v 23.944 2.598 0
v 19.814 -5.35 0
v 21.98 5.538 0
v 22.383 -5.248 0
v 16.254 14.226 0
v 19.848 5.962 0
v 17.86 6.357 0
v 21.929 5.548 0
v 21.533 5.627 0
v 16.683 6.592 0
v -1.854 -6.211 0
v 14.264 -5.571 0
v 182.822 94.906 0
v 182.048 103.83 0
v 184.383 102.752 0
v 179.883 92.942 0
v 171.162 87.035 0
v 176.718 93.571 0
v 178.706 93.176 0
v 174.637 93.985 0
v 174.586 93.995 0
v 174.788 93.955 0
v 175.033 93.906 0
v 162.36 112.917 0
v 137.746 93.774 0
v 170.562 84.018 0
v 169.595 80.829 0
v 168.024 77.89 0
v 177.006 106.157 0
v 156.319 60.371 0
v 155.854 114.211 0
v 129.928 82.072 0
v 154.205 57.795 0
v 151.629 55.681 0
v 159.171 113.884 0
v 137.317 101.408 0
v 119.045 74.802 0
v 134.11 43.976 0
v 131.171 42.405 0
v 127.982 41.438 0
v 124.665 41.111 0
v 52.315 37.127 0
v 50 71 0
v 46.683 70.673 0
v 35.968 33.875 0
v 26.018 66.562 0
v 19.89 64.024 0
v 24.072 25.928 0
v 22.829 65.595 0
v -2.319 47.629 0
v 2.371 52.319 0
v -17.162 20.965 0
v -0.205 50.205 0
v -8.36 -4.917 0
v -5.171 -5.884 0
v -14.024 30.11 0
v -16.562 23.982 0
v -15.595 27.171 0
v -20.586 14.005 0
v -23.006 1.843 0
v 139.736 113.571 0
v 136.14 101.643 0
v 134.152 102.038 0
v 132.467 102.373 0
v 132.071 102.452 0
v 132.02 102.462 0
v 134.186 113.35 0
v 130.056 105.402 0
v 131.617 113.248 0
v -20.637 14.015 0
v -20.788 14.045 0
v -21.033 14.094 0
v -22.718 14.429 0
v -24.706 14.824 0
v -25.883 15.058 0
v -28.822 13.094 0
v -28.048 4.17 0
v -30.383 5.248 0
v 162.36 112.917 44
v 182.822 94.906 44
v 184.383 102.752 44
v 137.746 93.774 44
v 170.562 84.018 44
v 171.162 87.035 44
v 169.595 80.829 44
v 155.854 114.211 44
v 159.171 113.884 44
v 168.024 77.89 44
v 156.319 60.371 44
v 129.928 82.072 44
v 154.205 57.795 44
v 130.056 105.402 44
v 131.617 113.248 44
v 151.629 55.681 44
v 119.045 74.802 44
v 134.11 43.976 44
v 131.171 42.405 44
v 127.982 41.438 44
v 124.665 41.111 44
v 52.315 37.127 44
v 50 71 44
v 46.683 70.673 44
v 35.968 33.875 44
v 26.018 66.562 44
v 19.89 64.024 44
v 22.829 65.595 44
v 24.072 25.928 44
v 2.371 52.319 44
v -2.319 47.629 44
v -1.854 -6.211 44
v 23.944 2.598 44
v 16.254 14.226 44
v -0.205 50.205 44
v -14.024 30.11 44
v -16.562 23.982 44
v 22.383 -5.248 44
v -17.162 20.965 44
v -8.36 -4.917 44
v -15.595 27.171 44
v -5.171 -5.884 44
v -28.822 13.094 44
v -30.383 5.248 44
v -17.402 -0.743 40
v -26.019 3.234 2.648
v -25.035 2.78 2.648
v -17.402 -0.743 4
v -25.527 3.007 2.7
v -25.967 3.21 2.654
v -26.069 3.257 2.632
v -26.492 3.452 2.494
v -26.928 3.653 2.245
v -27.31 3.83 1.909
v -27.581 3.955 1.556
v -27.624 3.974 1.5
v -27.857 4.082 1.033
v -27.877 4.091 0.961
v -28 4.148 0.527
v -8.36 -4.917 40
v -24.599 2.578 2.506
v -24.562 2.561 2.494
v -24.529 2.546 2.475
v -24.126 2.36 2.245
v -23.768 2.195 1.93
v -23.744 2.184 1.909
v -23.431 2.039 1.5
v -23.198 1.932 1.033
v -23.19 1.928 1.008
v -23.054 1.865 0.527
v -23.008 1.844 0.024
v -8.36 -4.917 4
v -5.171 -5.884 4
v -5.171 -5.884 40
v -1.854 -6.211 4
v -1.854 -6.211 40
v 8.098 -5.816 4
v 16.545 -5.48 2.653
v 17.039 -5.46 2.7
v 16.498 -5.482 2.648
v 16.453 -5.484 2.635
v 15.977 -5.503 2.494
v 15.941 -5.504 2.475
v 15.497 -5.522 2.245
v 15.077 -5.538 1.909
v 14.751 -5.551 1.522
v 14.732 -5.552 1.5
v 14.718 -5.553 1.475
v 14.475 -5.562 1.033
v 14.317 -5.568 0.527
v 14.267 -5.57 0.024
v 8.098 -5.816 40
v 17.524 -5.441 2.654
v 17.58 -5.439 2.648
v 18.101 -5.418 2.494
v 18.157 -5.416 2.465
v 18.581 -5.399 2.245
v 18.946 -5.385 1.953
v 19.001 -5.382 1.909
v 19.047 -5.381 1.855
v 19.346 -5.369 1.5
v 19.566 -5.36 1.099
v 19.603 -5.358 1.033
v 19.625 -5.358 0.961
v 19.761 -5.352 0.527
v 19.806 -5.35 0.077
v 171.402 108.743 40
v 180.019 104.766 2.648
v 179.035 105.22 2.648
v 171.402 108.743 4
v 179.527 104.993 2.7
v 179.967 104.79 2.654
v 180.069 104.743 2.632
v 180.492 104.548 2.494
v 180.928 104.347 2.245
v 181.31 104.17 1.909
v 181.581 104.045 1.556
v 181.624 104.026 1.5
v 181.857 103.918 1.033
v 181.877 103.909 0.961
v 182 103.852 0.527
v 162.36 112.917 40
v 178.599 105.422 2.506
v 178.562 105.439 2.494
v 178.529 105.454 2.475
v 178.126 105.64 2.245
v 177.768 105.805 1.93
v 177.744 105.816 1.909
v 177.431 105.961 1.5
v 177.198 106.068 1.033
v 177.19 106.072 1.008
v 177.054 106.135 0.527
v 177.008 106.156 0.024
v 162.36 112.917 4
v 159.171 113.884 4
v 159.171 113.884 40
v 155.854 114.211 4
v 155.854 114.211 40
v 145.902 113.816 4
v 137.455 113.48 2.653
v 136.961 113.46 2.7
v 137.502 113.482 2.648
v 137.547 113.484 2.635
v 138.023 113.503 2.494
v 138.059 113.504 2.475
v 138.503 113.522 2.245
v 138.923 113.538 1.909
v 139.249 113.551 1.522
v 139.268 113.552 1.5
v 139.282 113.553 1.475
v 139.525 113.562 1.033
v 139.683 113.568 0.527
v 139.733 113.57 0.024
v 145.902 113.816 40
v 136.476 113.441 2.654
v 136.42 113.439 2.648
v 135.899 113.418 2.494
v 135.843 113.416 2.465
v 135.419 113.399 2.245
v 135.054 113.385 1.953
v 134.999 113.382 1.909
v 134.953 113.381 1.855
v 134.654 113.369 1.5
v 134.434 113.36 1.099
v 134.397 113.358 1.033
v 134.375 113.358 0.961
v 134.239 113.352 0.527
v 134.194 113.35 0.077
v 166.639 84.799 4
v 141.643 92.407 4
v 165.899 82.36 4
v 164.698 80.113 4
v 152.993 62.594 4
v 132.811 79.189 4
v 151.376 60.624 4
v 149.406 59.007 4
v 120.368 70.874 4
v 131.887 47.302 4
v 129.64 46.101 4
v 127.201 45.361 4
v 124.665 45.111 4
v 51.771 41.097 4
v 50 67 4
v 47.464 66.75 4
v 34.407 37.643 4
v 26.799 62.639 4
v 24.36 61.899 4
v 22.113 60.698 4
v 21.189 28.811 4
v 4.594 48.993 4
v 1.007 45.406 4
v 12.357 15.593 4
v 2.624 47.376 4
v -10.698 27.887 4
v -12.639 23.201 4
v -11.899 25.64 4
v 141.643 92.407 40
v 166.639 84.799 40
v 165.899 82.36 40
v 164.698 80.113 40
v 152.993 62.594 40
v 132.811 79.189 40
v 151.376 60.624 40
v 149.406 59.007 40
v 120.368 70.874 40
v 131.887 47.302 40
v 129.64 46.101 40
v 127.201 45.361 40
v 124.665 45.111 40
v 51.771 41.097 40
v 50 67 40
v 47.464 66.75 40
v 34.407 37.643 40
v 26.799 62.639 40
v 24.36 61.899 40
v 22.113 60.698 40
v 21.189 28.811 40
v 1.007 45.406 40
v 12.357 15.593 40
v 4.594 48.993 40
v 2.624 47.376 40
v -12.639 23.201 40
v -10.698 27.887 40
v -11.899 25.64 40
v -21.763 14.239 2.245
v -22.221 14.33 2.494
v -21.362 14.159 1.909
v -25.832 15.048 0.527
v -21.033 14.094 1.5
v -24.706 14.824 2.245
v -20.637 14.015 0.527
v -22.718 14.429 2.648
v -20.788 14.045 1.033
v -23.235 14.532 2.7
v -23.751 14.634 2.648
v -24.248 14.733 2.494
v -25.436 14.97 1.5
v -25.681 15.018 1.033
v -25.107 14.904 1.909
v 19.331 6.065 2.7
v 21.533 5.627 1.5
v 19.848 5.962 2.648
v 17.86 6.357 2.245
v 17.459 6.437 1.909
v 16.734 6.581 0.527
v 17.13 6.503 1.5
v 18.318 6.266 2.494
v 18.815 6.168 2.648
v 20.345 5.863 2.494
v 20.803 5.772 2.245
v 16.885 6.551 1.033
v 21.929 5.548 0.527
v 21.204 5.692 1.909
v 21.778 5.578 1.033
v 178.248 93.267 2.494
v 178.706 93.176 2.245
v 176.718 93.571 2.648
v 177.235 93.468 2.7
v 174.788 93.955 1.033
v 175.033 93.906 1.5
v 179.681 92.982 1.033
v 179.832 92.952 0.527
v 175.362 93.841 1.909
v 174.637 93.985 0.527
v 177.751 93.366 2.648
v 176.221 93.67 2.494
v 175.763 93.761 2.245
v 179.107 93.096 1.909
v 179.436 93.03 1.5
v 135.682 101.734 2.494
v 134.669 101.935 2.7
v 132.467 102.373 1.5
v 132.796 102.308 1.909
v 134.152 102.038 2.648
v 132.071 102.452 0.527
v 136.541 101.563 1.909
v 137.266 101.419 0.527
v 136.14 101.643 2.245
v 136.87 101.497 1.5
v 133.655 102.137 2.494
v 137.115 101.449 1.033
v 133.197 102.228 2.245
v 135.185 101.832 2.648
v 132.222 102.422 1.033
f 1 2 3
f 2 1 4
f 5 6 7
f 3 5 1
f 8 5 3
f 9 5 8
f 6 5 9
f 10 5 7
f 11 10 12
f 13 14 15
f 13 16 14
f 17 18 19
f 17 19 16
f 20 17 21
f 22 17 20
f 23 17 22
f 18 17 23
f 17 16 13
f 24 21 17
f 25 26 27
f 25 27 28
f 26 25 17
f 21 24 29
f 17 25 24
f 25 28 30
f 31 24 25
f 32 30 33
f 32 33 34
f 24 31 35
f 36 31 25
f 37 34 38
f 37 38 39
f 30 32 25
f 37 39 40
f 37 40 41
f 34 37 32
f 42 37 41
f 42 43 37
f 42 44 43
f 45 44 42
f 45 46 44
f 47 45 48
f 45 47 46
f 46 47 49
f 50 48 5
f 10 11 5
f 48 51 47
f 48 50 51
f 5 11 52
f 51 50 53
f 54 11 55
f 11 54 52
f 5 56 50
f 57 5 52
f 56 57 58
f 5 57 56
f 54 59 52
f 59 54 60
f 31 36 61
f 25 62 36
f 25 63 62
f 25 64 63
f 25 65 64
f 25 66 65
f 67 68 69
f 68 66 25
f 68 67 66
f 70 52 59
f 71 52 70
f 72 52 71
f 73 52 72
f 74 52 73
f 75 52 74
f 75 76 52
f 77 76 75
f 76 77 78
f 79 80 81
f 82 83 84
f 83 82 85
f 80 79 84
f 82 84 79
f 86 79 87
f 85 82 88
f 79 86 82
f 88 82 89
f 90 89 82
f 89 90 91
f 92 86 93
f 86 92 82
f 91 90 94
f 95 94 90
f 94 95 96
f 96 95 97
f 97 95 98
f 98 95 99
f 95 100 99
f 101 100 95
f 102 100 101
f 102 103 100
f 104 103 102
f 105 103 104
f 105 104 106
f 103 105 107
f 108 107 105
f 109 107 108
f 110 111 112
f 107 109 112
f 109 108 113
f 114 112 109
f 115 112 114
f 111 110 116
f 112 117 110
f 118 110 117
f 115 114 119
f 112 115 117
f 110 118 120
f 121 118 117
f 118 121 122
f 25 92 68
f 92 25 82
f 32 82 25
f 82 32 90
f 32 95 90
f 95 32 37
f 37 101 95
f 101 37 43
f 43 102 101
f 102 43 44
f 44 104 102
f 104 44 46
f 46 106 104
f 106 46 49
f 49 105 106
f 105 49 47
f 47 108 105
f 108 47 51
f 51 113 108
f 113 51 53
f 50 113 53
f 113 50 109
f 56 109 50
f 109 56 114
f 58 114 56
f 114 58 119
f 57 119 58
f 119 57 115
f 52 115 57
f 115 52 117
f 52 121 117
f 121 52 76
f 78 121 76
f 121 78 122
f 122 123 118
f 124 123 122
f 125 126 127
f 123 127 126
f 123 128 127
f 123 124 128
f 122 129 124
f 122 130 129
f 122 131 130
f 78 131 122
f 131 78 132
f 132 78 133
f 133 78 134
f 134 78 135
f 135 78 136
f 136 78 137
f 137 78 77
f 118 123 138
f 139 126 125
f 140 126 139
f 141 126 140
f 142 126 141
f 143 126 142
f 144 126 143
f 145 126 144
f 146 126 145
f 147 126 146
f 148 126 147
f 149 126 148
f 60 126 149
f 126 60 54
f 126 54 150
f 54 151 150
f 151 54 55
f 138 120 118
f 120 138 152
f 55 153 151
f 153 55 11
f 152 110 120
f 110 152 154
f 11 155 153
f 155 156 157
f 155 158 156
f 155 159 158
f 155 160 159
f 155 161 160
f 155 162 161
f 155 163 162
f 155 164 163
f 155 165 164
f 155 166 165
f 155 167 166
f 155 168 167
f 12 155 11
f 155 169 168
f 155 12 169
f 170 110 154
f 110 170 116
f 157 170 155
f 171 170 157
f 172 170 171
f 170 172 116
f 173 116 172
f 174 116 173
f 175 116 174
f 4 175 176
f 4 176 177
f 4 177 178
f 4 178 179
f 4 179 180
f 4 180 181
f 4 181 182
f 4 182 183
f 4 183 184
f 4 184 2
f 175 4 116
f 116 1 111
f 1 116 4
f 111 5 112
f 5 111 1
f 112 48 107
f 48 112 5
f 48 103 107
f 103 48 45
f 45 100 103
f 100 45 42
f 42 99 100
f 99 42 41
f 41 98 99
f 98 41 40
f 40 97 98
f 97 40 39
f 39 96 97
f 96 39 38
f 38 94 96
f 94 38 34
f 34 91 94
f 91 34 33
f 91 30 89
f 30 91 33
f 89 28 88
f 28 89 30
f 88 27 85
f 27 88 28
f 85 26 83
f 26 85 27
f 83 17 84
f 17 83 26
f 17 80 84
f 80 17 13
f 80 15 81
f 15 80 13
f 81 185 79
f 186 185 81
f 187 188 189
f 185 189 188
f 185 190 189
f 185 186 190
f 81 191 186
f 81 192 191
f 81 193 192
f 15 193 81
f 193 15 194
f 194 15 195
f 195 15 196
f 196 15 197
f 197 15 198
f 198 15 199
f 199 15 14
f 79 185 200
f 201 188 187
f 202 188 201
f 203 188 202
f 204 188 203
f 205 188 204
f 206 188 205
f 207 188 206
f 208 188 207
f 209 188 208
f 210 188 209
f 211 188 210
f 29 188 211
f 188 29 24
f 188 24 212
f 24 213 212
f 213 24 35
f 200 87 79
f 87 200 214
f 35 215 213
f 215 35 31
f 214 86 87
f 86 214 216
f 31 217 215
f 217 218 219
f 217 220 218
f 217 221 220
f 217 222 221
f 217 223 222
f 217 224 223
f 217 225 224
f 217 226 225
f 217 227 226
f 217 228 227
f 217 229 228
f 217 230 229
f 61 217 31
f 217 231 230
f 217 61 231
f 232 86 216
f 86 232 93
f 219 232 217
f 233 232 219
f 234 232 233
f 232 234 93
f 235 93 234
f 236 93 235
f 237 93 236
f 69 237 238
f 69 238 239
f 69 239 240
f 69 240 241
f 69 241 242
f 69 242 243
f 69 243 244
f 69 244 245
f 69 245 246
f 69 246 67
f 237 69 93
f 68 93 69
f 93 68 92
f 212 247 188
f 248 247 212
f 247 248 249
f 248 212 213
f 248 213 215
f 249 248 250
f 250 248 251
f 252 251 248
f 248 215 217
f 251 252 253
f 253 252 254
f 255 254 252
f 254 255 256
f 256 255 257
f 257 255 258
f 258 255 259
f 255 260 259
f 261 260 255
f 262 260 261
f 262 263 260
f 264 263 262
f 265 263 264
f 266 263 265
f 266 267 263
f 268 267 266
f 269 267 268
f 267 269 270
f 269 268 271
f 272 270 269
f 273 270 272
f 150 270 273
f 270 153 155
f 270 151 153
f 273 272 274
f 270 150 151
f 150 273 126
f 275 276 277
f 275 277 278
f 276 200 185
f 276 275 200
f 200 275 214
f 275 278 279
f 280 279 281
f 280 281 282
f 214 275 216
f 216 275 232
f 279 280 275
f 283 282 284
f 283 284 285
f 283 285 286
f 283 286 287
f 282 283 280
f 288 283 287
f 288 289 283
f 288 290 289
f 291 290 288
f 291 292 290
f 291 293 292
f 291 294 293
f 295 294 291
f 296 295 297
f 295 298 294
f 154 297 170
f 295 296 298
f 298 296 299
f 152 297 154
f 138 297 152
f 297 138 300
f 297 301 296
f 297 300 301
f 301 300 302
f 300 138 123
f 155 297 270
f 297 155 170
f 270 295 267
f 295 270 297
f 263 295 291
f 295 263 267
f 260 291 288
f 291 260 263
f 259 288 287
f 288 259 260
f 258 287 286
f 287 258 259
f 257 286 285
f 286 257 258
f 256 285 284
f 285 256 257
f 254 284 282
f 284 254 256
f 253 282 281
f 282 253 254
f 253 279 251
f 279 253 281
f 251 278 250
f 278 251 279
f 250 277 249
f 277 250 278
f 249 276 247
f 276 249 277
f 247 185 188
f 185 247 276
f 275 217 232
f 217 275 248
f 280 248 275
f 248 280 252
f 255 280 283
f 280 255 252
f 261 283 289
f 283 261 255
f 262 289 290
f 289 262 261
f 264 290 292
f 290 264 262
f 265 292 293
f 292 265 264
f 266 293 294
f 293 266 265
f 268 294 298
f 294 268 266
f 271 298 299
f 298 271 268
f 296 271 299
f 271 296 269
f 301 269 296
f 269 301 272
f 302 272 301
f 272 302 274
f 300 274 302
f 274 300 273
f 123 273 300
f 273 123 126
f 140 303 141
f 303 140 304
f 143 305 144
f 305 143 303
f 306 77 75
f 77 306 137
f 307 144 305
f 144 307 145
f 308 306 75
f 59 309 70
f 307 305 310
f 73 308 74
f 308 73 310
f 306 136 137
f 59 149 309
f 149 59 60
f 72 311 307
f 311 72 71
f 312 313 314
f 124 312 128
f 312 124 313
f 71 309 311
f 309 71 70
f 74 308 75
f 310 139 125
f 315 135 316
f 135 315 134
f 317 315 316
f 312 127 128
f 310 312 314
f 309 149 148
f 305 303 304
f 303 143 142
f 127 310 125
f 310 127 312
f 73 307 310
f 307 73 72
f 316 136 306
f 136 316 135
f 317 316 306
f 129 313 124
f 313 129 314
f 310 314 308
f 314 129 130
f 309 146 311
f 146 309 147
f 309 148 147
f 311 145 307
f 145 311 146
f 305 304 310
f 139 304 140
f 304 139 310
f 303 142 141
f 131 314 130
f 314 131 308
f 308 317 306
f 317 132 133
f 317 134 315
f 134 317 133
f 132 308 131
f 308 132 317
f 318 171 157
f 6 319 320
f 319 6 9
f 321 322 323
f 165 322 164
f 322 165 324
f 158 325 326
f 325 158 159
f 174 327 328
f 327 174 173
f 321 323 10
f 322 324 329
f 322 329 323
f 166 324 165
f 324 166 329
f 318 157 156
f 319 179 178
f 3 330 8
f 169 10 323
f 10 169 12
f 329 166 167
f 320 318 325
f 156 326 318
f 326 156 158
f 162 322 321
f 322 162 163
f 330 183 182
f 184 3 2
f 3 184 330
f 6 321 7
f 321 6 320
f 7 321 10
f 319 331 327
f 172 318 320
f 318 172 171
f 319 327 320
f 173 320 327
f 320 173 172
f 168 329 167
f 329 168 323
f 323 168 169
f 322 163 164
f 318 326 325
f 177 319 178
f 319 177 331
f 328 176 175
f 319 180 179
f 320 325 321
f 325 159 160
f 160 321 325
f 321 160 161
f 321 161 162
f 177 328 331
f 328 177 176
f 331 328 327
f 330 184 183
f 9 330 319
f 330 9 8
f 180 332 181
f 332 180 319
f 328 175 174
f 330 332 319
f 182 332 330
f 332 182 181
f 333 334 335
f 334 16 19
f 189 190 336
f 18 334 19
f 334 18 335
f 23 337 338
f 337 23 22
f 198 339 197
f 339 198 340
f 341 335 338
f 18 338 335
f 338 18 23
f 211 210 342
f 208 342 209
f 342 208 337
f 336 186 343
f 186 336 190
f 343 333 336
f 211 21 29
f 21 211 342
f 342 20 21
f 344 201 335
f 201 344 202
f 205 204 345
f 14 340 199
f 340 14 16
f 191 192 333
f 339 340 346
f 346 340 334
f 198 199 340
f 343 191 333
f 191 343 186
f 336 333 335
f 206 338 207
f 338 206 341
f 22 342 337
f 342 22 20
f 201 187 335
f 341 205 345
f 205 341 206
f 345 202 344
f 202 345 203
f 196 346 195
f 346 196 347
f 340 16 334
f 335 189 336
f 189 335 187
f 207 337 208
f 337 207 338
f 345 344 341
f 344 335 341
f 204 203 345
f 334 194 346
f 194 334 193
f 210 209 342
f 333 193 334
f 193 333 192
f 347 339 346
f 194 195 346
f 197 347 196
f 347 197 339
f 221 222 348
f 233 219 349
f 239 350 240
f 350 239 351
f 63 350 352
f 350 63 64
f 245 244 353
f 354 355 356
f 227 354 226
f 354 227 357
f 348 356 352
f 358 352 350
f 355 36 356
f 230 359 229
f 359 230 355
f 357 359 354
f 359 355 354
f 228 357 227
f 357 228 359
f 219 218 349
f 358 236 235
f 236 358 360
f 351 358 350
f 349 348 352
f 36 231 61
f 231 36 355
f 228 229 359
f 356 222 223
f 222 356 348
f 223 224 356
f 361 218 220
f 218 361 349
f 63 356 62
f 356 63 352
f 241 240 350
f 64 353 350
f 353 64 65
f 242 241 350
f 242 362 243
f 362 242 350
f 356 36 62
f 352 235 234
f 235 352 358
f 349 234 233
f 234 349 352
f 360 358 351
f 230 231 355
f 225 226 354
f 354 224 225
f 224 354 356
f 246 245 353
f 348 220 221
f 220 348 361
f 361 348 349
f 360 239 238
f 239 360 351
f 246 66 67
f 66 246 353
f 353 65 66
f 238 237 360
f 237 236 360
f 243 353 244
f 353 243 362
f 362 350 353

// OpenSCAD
$fn = 32;

// ----------------------------------------------------------------------
// Air duct: 34 mm duct, 4 mm wall, 44 mm across
// ----------------------------------------------------------------------

// --- parameters (mm) ---
duct_r = 17;              // duct core radius
duct_d = 34;              // duct core diameter
wall = 4;                 // duct wall thickness
height = 44;              // duct width (extrusion height)
port_r = 26.9;            // port flange half width
port_d = 53.8;            // port flange width
port_t = 8;               // port flange thickness
bolt_d = 5.4;             // port bolt holes
bolt_offset = 21.7;       // bolt hole offset from the port axis

difference() {
  /* outer hull chain: tube with a flat flange plate at every port */
  linear_extrude(height = 44) {
    hull() {
      polygon([[22.383, -5.248], [-30.383, 5.248], [-28.822, 13.094], [23.944, 2.598]]);
      translate([-1.854, 10.789]) circle(r = 17);
    }
    hull() {
      translate([-1.854, 10.789]) circle(r = 17);
      translate([0.111, 20.665]) circle(r = 17);
    }
    hull() {
      translate([0.111, 20.665]) circle(r = 17);
      translate([11.816, 38.184]) circle(r = 17);
    }
    hull() {
      translate([11.816, 38.184]) circle(r = 17);
      translate([29.335, 49.889]) circle(r = 17);
    }
    hull() {
      translate([29.335, 49.889]) circle(r = 17);
      translate([50, 54]) circle(r = 17);
    }
    hull() {
      translate([50, 54]) circle(r = 17);
      translate([124.665, 58.111]) circle(r = 17);
    }
    hull() {
      translate([124.665, 58.111]) circle(r = 17);
      translate([142.184, 69.816]) circle(r = 17);
    }
    hull() {
      translate([142.184, 69.816]) circle(r = 17);
      translate([153.889, 87.335]) circle(r = 17);
    }
    hull() {
      translate([153.889, 87.335]) circle(r = 17);
      translate([155.854, 97.211]) circle(r = 17);
    }
    hull() {
      translate([155.854, 97.211]) circle(r = 17);
      polygon([[131.617, 113.248], [184.383, 102.752], [182.822, 94.906], [130.056, 105.402]]);
    }
  }
  /* air passage: the same chain inset by the wall, 5 mm proud of the ports */
  translate([0, 0, 4]) linear_extrude(height = 36) {
    hull() {
      translate([-4.975, -4.904]) circle(r = 13);
      translate([0.111, 20.665]) circle(r = 13);
    }
    hull() {
      translate([0.111, 20.665]) circle(r = 13);
      translate([11.816, 38.184]) circle(r = 13);
    }
    hull() {
      translate([11.816, 38.184]) circle(r = 13);
      translate([29.335, 49.889]) circle(r = 13);
    }
    hull() {
      translate([29.335, 49.889]) circle(r = 13);
      translate([50, 54]) circle(r = 13);
    }
    hull() {
      translate([50, 54]) circle(r = 13);
      translate([124.665, 58.111]) circle(r = 13);
    }
    hull() {
      translate([124.665, 58.111]) circle(r = 13);
      translate([142.184, 69.816]) circle(r = 13);
    }
    hull() {
      translate([142.184, 69.816]) circle(r = 13);
      translate([153.889, 87.335]) circle(r = 13);
    }
    hull() {
      translate([153.889, 87.335]) circle(r = 13);
      translate([158.975, 112.904]) circle(r = 13);
    }
  }
  translate([-4, 0]) rotate([0, 0, -11.25]) translate([-21.7, -2.5]) rotate([-90, 0, 0]) cylinder(h = 13, d = 5.4);
  translate([-4, 0]) rotate([0, 0, -11.25]) translate([21.7, -2.5]) rotate([-90, 0, 0]) cylinder(h = 13, d = 5.4);
  translate([158, 108]) rotate([0, 0, 168.75]) translate([-21.7, -2.5]) rotate([-90, 0, 0]) cylinder(h = 13, d = 5.4);
  translate([158, 108]) rotate([0, 0, 168.75]) translate([21.7, -2.5]) rotate([-90, 0, 0]) cylinder(h = 13, d = 5.4);
}
